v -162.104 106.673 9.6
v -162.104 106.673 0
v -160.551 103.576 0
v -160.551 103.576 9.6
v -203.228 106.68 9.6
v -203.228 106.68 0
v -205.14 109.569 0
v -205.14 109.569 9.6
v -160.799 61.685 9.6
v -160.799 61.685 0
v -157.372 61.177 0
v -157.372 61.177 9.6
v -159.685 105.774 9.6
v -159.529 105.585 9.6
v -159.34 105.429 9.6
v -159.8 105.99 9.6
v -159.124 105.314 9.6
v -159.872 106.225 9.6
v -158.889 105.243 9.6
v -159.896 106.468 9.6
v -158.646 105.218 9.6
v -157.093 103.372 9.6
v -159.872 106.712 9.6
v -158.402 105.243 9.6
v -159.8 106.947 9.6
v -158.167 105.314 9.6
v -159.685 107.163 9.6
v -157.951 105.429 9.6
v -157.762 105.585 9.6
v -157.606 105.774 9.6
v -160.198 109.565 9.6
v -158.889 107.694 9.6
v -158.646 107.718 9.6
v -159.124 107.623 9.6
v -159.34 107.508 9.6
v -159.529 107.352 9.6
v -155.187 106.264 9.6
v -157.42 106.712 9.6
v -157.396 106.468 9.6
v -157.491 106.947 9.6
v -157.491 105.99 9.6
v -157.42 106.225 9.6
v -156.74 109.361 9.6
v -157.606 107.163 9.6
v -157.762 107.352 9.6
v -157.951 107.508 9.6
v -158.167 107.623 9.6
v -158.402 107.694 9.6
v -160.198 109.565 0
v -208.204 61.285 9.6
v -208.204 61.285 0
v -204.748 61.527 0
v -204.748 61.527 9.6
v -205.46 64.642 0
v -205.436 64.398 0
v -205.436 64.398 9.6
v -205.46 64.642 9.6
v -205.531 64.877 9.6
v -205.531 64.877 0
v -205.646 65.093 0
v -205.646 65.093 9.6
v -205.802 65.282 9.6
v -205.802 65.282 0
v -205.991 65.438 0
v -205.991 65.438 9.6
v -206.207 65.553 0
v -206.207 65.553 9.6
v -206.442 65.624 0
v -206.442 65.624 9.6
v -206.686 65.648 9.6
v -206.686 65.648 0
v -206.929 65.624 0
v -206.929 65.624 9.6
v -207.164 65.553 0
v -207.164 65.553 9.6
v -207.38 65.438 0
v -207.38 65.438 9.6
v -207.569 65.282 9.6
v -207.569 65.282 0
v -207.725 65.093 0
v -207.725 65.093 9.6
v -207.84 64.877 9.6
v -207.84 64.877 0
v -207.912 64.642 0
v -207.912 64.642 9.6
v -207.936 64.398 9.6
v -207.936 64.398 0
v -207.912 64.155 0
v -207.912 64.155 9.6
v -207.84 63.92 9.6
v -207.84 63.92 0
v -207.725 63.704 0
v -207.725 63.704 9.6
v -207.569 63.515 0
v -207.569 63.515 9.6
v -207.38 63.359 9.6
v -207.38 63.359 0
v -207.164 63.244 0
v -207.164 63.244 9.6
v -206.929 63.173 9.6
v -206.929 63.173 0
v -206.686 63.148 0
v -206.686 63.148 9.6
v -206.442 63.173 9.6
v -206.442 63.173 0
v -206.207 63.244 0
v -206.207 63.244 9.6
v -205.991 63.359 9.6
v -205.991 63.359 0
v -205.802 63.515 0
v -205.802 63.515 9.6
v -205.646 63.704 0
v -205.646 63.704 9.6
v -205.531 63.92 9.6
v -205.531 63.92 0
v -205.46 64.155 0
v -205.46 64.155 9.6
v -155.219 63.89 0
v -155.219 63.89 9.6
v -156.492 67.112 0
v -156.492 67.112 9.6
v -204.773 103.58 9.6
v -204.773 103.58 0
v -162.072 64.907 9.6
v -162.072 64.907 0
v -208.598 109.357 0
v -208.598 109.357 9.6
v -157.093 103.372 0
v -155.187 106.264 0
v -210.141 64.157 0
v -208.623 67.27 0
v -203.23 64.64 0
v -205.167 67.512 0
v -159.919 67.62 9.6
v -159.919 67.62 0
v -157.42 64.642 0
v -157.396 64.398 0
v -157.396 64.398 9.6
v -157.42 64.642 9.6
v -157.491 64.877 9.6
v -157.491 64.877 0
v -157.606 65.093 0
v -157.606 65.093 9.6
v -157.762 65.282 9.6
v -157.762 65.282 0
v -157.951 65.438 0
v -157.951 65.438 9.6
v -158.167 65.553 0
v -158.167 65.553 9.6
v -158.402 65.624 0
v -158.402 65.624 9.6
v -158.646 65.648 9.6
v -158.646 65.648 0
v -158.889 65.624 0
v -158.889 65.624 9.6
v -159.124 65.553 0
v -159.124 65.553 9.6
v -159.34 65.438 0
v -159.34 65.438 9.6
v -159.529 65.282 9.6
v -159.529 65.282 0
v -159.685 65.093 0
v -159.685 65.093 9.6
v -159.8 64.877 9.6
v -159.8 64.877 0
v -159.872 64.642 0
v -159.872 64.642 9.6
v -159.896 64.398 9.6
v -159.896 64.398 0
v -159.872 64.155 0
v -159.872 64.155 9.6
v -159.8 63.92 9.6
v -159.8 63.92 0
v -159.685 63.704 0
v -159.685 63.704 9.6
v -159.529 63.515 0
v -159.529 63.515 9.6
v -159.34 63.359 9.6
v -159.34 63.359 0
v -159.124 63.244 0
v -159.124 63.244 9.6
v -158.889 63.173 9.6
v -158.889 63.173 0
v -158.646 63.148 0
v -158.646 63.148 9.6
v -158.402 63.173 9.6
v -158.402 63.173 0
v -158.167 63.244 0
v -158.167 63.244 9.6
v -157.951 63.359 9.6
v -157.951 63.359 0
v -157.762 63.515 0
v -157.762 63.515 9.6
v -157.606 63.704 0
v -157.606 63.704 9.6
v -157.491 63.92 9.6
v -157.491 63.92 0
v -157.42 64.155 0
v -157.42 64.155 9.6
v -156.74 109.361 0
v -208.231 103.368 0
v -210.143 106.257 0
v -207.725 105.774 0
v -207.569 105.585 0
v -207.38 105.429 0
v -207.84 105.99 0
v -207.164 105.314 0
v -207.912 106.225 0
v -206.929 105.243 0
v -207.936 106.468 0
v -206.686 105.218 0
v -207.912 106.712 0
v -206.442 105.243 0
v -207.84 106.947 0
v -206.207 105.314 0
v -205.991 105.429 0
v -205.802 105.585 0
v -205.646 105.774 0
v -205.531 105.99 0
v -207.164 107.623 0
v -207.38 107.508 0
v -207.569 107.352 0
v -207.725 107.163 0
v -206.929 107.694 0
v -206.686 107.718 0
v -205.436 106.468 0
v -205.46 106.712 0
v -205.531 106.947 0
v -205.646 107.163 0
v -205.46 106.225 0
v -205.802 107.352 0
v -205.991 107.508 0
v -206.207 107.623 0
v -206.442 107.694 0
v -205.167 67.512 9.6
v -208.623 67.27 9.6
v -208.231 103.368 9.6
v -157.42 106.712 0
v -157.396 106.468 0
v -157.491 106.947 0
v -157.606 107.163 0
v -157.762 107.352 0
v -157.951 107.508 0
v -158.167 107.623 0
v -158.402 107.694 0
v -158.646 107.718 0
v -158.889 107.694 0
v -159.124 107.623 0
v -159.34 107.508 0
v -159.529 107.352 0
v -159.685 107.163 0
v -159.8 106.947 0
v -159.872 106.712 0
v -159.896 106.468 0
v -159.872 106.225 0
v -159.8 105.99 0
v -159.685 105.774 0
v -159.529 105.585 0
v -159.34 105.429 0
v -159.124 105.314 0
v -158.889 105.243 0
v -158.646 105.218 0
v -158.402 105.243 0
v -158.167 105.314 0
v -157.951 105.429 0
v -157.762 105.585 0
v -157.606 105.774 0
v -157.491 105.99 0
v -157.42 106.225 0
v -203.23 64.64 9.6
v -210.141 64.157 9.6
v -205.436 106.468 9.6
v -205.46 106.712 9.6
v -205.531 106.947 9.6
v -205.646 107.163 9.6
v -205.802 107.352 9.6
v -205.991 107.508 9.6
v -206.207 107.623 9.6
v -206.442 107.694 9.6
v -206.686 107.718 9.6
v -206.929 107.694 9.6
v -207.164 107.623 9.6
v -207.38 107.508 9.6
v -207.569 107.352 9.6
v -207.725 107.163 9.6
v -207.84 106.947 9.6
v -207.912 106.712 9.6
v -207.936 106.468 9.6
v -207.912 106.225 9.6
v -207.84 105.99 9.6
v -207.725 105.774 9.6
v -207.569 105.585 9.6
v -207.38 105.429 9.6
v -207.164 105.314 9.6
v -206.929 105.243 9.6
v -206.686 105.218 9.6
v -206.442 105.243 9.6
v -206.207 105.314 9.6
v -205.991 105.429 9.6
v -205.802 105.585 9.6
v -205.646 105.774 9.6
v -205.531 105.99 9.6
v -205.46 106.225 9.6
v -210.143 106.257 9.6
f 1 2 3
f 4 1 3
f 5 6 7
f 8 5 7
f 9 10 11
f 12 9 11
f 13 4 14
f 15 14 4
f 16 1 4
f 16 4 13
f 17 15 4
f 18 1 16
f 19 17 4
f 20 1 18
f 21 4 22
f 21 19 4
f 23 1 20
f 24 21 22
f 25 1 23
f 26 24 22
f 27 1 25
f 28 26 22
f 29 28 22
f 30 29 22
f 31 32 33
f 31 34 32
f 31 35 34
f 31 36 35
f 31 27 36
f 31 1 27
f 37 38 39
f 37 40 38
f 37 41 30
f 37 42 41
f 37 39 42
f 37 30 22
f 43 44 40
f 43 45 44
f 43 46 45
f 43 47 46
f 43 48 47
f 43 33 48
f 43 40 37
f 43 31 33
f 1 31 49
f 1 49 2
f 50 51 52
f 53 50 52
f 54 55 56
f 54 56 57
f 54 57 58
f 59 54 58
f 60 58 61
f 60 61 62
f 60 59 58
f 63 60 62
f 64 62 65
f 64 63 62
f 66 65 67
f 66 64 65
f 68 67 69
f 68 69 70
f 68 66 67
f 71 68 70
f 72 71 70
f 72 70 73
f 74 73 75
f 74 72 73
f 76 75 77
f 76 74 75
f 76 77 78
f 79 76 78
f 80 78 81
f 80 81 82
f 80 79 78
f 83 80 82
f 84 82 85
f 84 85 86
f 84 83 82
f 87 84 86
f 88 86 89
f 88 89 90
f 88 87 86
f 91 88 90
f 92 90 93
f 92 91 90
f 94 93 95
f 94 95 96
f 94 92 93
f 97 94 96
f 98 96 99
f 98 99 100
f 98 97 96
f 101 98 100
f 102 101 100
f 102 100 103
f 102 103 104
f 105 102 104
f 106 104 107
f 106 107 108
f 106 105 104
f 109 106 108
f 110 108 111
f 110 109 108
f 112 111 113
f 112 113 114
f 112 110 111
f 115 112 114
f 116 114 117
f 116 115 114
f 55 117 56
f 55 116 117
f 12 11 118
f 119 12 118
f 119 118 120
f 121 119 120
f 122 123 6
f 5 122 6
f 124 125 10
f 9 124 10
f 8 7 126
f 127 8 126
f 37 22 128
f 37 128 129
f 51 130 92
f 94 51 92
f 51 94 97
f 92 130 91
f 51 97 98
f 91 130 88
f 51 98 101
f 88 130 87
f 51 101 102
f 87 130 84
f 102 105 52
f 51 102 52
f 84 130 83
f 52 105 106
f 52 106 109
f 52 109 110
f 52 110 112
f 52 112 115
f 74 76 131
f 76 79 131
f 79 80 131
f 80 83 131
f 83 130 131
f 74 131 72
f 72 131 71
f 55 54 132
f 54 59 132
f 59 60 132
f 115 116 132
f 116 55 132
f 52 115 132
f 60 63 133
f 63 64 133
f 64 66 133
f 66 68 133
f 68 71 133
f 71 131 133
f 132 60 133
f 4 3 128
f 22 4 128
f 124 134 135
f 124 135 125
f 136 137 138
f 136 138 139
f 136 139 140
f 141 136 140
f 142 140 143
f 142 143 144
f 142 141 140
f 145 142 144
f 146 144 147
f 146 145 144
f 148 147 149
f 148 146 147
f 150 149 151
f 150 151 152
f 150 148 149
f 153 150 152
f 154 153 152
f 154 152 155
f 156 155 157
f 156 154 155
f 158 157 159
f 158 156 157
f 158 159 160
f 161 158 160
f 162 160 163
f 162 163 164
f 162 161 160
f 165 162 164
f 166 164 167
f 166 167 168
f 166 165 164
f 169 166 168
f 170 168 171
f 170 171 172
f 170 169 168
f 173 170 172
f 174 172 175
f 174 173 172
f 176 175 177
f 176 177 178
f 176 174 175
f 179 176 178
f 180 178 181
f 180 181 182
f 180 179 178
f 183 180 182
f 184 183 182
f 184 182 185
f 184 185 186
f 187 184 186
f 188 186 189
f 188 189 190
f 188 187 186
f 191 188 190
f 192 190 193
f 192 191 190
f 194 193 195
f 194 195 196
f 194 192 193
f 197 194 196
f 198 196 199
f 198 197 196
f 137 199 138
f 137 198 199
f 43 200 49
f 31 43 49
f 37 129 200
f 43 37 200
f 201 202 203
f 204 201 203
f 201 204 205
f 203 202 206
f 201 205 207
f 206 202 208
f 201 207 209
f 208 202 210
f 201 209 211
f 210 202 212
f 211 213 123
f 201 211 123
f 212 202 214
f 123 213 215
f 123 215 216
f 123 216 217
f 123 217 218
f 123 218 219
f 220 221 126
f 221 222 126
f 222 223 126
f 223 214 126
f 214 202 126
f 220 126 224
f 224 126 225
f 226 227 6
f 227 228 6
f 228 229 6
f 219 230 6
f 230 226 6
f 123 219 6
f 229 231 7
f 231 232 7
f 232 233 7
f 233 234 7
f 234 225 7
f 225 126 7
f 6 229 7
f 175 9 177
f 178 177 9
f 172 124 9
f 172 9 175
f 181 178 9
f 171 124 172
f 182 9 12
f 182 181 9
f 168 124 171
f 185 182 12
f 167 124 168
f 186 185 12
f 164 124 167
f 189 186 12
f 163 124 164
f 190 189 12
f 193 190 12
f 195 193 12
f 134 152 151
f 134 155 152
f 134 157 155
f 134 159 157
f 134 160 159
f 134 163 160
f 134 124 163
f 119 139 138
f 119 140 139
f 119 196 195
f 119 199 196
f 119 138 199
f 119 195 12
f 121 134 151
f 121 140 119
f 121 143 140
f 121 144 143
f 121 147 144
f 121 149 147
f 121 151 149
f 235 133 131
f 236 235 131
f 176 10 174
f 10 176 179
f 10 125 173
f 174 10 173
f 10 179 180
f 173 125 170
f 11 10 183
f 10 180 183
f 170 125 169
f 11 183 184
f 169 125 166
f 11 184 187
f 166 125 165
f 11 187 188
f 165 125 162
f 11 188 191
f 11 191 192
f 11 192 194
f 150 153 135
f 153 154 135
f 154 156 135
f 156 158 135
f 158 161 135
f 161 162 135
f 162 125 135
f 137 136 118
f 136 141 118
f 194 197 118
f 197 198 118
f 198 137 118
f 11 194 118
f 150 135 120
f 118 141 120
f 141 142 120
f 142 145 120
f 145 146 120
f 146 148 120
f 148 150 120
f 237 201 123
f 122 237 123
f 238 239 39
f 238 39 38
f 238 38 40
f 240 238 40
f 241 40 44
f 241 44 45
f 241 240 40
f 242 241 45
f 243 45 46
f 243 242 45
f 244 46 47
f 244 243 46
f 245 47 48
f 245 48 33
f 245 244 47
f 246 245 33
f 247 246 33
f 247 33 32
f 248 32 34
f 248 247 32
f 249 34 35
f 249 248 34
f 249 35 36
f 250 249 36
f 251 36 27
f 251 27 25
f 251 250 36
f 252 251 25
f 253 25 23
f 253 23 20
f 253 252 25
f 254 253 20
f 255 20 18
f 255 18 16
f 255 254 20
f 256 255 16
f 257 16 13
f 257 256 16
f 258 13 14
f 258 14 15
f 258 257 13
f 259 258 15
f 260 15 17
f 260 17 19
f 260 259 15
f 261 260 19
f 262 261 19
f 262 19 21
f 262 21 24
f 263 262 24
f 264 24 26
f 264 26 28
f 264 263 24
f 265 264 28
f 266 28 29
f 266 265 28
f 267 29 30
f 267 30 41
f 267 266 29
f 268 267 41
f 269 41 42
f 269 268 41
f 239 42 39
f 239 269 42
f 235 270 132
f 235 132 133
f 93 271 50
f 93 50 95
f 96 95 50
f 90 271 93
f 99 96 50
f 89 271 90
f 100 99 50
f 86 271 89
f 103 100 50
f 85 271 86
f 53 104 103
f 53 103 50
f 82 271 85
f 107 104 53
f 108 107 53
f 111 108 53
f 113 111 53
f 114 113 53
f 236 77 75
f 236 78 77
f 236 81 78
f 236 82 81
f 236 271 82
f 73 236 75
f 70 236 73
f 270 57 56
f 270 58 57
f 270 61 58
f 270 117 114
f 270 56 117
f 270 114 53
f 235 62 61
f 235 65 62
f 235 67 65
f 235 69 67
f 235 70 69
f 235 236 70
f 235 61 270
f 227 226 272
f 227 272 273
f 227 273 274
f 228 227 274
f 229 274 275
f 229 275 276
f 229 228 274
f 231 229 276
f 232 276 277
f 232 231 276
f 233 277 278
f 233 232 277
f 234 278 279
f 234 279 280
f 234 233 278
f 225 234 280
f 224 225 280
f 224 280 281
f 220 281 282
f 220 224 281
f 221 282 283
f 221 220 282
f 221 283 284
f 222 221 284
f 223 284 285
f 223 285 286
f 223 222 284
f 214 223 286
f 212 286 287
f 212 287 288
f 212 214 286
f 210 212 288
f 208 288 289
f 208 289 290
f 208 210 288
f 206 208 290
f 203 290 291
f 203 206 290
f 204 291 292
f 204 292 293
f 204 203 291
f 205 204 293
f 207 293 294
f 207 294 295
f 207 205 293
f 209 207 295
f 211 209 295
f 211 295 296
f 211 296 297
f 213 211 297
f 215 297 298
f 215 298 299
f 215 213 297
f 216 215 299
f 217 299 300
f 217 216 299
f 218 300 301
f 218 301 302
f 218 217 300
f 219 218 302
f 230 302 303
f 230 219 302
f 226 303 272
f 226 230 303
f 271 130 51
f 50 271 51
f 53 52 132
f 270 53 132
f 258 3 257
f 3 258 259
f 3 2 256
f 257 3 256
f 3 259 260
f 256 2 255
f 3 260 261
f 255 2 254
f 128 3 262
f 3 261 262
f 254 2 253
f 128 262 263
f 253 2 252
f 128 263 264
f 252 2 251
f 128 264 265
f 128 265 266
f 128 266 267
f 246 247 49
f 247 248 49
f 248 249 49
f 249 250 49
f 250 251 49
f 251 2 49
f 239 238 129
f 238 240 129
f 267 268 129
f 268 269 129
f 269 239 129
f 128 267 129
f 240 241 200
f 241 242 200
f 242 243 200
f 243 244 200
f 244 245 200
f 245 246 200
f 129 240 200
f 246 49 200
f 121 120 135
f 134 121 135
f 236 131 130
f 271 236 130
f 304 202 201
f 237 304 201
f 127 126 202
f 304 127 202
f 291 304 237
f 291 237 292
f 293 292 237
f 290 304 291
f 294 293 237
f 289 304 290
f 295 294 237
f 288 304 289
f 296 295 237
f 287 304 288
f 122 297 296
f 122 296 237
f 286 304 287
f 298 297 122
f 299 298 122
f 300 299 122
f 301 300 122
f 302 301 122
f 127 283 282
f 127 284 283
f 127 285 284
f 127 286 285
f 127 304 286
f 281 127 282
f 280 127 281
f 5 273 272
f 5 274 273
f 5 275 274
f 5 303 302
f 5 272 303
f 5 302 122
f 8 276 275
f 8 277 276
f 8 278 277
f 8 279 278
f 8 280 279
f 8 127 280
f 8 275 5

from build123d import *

# Parameters (mm, degrees)
SKETCH1_R             = 1.25
BOSS_EXTRUDE1_DEPTH   = 9.6
BOSS_EXTRUDE1_2_DEPTH = 9.6
BOSS_EXTRUDE1_3_DEPTH = 9.6
BOSS_EXTRUDE1_4_DEPTH = 9.6


with BuildPart() as part:
    # Sketch1 → Boss-Extrude1 (new body)
    with BuildSketch(Plane.XY):
        Polygon((-204.773374991, 103.579956463), (-203.227897726, 106.680198392), (-205.140047362, 109.56874193), (-208.597674263, 109.357043538), (-210.143151529, 106.256801608), (-208.231001893, 103.368258071), align=None)
        with Locations((-206.685524627, 106.4685)):
            Circle(SKETCH1_R, mode=Mode.SUBTRACT)
    extrude(amount=BOSS_EXTRUDE1_DEPTH)


with BuildPart() as body_2:
    # Sketch1 → Boss-Extrude1 2 (new body)
    with BuildSketch(Plane.XY):
        Polygon((-157.093384884, 103.371588278), (-155.187450531, 106.264236587), (-156.739590274, 109.36114831), (-160.197664371, 109.565411723), (-162.103598724, 106.672763414), (-160.551458981, 103.575851691), align=None)
        with Locations((-158.645524627, 106.4685)):
            Circle(SKETCH1_R, mode=Mode.SUBTRACT)
    extrude(amount=BOSS_EXTRUDE1_2_DEPTH)


with BuildPart() as body_3:
    # Sketch1 → Boss-Extrude1 3 (new body)
    with BuildSketch(Plane.XY):
        Polygon((-204.748368835, 61.526666538), (-203.229865997, 64.640209397), (-205.16702179, 67.512042859), (-208.62268042, 67.270333463), (-210.141183257, 64.156790604), (-208.204027465, 61.284957142), align=None)
        with Locations((-206.685524627, 64.3985)):
            Circle(SKETCH1_R, mode=Mode.SUBTRACT)
    extrude(amount=BOSS_EXTRUDE1_3_DEPTH)


with BuildPart() as body_4:
    # Sketch1 → Boss-Extrude1 4 (new body)
    with BuildSketch(Plane.XY):
        Polygon((-157.372499469, 61.176791301), (-155.21893047, 63.890117777), (-156.491955629, 67.111826477), (-159.918549785, 67.6202087), (-162.072118784, 64.906882224), (-160.799093626, 61.685173524), align=None)
        with Locations((-158.645524627, 64.3985)):
            Circle(SKETCH1_R, mode=Mode.SUBTRACT)
    extrude(amount=BOSS_EXTRUDE1_4_DEPTH)


solid = Compound([part.part, body_2.part, body_3.part, body_4.part])
